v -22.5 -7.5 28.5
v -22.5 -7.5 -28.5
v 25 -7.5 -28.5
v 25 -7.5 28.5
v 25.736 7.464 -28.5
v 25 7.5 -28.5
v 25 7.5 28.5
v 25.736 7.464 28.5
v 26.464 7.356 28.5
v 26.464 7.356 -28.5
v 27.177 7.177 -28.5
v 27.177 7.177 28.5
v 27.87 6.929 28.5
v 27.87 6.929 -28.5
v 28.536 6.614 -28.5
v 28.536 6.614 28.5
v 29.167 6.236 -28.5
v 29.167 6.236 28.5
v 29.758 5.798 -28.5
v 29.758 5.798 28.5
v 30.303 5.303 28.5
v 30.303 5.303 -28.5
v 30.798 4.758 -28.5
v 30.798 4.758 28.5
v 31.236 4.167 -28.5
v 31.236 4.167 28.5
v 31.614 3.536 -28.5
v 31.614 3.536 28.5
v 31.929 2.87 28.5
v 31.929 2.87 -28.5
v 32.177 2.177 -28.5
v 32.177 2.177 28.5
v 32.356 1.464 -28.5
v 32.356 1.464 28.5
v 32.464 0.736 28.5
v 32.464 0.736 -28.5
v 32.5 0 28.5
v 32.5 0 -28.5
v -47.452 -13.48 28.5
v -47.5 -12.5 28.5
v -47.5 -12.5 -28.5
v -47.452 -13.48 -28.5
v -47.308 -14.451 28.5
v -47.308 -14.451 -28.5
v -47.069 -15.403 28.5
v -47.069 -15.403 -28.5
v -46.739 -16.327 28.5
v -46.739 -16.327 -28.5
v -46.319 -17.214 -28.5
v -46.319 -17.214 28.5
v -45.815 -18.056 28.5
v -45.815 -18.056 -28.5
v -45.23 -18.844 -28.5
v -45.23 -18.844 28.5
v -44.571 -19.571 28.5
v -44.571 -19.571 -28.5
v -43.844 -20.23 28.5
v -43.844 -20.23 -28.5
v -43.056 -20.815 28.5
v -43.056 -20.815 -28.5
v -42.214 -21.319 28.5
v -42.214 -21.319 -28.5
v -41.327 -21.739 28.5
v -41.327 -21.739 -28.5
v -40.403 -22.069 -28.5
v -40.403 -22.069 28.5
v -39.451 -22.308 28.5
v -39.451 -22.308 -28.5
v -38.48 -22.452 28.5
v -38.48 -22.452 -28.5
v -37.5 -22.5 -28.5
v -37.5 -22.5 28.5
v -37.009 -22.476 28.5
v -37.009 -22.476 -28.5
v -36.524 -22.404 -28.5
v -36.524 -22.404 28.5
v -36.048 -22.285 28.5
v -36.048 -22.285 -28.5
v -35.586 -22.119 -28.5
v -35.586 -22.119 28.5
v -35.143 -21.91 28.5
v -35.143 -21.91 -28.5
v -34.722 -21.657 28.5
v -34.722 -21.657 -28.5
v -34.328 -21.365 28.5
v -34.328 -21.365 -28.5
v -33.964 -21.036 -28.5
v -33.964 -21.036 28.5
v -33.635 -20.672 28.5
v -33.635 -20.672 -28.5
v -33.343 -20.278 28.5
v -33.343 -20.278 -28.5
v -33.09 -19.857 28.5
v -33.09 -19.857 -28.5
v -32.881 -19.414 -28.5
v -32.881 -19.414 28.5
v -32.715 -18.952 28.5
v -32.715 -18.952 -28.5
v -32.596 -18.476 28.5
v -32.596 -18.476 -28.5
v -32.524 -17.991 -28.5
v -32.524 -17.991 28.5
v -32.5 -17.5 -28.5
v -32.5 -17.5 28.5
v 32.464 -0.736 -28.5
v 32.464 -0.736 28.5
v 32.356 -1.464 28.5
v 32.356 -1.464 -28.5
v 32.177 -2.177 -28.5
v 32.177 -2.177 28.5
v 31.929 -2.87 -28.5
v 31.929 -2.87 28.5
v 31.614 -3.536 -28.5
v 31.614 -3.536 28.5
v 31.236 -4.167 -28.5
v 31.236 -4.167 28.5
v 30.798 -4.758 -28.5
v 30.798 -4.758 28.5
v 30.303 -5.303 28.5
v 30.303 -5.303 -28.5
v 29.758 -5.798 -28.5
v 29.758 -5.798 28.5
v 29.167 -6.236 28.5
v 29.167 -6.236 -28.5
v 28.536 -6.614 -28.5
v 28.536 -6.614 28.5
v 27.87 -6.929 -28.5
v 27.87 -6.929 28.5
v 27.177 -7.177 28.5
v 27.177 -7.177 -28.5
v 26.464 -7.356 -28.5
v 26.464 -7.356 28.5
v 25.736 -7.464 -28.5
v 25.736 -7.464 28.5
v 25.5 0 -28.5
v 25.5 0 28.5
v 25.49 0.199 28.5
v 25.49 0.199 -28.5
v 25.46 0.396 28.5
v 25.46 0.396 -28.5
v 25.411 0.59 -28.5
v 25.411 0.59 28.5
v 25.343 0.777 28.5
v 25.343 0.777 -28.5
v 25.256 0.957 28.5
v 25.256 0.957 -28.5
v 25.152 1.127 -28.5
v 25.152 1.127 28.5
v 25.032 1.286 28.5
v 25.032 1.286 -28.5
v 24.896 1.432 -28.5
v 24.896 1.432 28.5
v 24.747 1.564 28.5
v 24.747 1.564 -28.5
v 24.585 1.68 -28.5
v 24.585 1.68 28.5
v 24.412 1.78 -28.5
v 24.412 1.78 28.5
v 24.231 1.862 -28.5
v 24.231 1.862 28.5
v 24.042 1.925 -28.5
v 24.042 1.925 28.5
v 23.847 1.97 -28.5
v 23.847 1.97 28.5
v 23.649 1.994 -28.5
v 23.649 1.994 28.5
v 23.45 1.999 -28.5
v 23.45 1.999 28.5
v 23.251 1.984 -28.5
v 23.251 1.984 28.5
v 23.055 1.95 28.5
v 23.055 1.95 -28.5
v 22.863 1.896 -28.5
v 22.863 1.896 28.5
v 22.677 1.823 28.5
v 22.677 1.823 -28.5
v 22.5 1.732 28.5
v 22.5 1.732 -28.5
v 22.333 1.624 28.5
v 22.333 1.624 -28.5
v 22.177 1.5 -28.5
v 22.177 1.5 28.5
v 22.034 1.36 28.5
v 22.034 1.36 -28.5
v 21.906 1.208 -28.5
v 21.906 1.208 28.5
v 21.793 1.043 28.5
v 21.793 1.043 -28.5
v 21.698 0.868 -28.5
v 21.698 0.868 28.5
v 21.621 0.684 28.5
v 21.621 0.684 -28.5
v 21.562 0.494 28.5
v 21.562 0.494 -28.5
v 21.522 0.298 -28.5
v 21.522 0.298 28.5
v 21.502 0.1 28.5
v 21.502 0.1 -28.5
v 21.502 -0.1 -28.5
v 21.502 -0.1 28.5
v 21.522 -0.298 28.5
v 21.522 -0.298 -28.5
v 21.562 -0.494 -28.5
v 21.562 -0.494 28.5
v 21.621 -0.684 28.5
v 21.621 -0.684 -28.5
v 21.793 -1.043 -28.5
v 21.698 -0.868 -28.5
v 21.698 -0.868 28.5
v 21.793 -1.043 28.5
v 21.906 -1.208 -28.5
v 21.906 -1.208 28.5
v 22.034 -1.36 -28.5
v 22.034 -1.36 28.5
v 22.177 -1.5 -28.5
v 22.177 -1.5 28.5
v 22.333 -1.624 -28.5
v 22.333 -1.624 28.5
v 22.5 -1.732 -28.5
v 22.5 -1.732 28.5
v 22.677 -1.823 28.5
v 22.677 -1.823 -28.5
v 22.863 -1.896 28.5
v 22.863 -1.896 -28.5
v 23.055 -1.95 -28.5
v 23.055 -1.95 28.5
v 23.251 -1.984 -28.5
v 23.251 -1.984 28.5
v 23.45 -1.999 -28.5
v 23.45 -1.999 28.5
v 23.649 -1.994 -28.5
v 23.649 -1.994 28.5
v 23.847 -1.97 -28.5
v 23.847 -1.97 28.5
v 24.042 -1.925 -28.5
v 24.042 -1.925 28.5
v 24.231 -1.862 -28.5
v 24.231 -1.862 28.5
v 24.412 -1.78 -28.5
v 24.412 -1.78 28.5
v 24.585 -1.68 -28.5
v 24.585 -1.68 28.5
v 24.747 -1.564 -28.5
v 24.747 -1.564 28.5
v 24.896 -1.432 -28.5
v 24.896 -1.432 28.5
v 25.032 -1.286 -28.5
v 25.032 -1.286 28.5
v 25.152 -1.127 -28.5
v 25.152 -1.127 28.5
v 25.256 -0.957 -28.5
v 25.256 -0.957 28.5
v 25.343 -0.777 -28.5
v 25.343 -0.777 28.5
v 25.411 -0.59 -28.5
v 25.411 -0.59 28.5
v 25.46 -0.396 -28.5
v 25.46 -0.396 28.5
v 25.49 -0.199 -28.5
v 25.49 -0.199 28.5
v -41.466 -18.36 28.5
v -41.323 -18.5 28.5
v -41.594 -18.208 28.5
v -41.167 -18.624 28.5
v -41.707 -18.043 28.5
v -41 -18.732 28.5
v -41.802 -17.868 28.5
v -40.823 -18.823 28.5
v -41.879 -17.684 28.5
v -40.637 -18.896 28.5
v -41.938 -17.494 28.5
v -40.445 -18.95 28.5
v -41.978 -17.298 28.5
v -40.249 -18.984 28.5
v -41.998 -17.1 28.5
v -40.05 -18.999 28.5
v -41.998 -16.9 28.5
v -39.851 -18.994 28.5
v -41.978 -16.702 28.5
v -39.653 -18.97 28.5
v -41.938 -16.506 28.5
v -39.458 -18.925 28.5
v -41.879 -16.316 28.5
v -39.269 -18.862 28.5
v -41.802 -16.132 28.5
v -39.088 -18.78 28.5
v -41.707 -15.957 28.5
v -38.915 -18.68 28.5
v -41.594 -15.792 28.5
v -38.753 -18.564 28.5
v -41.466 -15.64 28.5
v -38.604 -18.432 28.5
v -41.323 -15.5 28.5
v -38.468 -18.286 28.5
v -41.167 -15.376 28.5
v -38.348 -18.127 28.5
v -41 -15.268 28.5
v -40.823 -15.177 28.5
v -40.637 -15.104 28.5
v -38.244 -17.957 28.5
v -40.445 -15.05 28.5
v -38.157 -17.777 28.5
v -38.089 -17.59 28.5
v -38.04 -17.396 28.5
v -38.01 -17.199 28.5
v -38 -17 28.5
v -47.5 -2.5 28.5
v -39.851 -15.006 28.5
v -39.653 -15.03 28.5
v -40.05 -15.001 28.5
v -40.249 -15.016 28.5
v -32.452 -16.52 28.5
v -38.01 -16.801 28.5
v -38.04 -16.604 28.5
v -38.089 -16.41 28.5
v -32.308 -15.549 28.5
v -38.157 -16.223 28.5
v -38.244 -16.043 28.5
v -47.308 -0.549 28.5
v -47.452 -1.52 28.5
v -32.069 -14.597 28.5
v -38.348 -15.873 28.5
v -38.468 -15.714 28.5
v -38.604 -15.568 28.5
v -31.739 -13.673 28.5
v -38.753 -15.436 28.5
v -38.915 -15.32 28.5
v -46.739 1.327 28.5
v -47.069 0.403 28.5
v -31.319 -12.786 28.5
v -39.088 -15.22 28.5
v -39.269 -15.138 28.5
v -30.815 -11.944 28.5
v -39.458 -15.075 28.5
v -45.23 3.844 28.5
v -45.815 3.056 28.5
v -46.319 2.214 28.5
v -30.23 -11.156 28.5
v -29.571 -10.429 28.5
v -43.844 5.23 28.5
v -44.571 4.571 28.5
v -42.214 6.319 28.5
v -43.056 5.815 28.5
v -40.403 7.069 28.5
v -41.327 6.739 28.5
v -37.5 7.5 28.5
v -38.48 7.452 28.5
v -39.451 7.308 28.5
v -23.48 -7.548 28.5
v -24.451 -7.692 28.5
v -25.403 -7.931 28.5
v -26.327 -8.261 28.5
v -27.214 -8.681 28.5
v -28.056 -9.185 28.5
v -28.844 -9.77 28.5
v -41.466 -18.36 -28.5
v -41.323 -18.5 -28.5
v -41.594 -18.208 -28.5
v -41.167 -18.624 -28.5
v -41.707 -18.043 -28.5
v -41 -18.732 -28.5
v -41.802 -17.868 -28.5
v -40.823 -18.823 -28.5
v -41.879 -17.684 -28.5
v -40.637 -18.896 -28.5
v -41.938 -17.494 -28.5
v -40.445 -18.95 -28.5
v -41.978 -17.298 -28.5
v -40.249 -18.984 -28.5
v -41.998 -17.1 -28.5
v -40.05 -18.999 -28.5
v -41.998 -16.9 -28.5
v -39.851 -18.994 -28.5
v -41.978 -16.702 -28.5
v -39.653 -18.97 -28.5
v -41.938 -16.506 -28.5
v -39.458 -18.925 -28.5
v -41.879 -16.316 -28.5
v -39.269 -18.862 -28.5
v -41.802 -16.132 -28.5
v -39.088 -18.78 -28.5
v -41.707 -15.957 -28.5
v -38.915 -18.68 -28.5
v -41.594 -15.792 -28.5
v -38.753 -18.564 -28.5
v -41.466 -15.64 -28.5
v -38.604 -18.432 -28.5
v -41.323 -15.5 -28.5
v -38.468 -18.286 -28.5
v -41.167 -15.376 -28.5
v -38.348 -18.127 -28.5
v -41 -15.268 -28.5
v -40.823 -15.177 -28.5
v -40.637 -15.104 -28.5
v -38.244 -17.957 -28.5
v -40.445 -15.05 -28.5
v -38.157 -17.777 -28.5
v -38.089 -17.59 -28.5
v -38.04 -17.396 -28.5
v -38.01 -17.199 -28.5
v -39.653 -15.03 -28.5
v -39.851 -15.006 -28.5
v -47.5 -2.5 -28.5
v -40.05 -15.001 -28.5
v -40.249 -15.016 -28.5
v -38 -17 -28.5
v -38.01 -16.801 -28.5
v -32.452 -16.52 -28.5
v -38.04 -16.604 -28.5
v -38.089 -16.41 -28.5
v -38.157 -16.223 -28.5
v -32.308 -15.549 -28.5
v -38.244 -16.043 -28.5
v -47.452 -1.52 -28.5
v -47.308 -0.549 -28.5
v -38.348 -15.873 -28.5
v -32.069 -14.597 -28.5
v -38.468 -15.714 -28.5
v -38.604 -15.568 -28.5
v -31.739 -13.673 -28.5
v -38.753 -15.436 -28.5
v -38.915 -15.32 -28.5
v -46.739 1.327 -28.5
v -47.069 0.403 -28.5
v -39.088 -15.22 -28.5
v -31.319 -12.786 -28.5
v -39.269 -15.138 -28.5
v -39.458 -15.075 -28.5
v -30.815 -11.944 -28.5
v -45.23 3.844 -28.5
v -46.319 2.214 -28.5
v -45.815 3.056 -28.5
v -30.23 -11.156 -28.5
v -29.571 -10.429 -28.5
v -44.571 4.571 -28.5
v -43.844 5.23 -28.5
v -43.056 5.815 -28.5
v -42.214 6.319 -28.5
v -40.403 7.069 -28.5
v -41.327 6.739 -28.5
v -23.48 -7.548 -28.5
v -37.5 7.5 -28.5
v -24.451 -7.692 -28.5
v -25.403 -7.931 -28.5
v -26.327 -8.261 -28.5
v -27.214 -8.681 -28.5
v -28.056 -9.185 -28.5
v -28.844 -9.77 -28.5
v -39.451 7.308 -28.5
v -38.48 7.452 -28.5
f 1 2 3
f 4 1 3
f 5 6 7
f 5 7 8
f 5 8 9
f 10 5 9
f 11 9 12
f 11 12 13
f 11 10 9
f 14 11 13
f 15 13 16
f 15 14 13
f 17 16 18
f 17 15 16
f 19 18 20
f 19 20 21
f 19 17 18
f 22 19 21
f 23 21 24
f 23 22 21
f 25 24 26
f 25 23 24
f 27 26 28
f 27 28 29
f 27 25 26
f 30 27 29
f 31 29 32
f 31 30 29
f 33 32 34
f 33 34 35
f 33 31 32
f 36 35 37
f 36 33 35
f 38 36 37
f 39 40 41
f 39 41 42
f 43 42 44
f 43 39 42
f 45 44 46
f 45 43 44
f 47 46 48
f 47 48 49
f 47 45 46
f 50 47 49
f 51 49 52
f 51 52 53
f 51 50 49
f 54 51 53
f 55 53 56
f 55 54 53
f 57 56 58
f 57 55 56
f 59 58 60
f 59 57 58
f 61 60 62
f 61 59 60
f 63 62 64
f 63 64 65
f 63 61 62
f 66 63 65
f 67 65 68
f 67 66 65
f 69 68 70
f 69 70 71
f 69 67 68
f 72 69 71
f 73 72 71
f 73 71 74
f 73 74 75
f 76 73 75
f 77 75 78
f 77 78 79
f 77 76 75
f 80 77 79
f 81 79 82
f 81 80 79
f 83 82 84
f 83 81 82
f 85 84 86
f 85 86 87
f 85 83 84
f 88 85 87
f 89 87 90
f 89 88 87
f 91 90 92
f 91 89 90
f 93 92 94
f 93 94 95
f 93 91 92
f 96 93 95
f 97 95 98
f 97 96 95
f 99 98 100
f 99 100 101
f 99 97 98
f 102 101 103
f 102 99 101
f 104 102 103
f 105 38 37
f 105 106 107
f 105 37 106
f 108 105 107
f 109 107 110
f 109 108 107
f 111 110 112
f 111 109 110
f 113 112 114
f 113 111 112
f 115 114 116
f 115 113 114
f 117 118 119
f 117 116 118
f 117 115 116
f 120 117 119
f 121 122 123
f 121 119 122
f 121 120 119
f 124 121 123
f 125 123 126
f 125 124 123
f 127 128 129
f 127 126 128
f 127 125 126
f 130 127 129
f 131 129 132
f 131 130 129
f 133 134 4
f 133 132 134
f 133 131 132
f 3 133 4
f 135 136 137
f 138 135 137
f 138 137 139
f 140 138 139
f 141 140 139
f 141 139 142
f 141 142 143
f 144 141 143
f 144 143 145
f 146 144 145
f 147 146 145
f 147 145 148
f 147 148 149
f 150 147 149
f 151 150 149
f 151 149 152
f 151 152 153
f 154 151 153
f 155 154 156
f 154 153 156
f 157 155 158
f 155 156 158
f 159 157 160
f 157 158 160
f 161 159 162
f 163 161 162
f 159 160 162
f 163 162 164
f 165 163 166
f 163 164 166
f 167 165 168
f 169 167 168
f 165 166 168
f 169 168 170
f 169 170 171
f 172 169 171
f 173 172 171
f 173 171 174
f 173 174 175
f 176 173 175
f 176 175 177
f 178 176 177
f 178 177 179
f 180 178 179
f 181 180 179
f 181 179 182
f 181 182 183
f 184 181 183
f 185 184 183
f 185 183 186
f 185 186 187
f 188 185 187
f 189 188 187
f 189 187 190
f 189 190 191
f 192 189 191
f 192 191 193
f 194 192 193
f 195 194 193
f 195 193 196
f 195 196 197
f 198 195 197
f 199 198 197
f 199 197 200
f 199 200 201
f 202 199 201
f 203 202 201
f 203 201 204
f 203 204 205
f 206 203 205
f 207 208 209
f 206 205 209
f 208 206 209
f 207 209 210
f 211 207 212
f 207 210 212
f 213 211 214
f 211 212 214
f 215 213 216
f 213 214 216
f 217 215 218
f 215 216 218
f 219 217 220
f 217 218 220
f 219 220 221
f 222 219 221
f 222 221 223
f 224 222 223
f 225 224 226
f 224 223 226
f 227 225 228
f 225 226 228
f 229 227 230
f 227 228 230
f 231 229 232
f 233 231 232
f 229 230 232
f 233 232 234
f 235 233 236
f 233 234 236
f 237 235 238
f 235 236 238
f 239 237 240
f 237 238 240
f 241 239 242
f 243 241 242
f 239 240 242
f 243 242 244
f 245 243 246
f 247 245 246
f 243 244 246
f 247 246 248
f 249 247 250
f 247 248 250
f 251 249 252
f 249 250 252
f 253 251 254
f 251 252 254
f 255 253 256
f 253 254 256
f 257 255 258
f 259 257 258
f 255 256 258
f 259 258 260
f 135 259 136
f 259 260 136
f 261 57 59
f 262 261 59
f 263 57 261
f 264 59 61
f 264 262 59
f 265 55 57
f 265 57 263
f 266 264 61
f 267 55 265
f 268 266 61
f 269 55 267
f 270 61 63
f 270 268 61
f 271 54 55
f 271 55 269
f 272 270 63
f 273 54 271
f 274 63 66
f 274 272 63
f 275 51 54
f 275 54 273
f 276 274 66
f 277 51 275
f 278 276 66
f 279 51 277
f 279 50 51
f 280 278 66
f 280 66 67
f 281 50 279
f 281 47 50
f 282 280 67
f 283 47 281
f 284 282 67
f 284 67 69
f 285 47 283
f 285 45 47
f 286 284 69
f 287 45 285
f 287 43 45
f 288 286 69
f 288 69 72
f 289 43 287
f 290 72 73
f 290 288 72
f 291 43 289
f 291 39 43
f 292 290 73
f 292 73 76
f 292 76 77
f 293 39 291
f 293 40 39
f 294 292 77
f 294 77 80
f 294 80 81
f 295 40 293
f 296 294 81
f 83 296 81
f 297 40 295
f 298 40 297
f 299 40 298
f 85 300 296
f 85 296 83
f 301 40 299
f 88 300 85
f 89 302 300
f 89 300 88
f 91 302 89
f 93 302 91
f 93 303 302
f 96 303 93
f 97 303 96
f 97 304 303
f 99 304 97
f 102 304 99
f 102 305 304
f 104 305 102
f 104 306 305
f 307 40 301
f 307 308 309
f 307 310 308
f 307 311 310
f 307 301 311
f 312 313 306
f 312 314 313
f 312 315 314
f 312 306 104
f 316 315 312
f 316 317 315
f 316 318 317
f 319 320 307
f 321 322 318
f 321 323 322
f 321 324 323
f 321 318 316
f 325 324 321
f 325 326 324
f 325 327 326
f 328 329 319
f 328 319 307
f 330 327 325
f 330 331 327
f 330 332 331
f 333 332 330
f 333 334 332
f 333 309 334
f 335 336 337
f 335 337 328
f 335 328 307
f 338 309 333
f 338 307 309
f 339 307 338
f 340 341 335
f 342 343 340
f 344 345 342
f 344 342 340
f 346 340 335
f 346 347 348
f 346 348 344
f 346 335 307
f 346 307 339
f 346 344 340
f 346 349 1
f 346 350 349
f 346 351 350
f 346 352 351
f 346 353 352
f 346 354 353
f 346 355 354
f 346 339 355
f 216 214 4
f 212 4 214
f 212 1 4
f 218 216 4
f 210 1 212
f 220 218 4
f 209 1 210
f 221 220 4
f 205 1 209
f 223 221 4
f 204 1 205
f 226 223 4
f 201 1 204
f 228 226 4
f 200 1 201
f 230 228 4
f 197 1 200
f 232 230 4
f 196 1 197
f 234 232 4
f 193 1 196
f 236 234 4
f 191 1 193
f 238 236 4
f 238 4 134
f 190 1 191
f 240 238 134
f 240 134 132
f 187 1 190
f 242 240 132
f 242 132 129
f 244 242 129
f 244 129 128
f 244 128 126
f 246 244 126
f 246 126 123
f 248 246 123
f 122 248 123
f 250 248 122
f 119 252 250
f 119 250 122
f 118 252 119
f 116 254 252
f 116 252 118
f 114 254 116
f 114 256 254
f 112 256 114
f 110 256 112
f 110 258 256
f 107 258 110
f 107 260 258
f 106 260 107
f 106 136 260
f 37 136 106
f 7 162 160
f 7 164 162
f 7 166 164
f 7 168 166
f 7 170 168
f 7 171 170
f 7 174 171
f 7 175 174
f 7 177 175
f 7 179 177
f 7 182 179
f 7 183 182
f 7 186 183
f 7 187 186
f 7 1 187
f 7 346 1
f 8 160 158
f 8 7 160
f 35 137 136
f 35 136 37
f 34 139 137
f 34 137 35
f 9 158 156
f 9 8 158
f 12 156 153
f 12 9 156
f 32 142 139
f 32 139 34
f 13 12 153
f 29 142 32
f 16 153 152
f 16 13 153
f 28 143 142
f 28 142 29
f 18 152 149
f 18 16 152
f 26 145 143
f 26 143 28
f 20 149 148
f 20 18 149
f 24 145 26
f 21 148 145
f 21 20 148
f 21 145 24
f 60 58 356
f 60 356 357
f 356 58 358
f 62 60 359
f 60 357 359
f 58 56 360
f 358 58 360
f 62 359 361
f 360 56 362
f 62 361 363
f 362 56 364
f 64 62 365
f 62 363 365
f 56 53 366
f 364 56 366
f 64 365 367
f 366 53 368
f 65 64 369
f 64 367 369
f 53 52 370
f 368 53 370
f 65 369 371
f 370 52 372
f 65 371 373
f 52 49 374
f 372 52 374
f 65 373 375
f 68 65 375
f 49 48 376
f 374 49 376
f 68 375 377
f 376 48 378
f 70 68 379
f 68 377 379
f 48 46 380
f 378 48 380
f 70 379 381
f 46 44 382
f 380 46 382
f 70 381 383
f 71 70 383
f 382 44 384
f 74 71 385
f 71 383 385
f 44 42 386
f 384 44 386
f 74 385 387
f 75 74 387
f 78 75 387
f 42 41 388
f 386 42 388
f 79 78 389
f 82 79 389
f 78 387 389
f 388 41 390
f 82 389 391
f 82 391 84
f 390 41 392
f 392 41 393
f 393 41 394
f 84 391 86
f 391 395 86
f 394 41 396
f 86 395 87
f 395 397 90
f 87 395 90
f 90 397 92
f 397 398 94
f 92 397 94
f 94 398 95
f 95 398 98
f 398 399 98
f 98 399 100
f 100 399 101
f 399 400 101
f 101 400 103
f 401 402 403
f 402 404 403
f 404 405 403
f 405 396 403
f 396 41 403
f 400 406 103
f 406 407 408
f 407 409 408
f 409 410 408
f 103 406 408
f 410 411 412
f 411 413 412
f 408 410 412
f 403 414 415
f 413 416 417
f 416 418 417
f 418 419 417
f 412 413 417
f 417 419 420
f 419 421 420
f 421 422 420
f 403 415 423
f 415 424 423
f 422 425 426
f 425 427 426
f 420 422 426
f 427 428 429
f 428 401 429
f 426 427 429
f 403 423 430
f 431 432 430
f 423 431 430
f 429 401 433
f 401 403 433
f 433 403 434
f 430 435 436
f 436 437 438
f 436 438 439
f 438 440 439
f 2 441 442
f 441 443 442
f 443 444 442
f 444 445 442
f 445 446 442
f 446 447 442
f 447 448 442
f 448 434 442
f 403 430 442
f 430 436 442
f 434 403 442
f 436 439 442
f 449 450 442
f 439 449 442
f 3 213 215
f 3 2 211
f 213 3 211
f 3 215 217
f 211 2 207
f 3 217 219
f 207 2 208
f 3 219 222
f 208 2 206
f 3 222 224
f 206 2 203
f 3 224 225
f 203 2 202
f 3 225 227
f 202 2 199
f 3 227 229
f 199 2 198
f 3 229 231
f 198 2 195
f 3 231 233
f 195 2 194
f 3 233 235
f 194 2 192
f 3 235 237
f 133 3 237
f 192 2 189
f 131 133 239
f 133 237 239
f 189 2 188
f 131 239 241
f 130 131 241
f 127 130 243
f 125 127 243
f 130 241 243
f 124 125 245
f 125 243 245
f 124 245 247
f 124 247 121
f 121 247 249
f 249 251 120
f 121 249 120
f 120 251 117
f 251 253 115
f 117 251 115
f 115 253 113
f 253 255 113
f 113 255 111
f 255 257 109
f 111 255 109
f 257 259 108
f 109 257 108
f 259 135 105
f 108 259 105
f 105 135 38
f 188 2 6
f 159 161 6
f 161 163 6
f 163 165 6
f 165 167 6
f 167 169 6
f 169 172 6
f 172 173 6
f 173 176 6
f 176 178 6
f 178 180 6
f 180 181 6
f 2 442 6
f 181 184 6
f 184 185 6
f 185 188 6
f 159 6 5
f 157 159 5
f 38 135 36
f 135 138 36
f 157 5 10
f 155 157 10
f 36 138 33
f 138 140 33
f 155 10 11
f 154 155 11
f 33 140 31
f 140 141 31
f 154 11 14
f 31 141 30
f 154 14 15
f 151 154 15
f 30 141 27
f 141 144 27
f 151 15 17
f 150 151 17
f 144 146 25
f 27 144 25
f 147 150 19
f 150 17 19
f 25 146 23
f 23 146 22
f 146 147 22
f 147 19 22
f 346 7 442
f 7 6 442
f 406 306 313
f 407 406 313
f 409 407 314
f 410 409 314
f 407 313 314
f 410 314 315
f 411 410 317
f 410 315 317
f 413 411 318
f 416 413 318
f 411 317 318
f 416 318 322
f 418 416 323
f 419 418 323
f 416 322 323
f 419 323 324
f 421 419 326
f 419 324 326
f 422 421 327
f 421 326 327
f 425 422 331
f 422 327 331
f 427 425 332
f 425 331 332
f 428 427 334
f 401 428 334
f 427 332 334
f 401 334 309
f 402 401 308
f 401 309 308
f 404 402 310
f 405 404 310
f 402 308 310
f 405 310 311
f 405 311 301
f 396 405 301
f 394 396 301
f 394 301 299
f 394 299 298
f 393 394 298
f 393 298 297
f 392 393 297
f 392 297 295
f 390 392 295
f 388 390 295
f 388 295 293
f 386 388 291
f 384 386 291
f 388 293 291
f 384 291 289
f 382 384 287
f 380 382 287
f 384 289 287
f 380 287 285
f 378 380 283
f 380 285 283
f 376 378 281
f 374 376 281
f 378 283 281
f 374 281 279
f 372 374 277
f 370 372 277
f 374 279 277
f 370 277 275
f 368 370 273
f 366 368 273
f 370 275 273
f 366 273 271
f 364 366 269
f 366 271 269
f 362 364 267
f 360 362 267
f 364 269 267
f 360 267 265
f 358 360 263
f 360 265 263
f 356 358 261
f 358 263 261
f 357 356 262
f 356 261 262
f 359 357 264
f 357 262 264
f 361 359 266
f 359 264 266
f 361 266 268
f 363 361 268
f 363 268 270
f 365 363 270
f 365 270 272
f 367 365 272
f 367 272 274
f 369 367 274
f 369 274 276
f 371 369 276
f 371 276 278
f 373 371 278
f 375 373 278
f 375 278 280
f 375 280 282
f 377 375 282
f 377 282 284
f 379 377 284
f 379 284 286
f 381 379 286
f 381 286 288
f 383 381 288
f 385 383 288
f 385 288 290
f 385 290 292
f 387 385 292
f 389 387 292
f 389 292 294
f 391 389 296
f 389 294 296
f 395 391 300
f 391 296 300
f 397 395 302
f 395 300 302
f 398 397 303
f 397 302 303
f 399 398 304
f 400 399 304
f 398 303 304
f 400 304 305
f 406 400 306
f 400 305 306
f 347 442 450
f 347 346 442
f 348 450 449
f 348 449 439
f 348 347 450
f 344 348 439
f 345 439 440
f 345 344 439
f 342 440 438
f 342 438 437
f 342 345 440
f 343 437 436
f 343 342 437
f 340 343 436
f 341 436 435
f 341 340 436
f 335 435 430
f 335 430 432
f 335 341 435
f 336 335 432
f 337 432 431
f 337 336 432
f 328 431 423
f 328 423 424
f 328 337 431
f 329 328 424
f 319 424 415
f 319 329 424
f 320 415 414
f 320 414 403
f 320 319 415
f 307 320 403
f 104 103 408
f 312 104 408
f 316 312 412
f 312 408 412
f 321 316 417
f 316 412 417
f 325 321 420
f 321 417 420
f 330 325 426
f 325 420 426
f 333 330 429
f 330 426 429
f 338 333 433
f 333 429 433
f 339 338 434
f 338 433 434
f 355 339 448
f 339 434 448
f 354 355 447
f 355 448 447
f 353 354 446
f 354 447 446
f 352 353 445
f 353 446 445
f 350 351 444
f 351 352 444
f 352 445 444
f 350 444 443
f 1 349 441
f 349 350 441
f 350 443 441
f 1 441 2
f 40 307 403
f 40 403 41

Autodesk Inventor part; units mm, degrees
ref_plane "XZ Plane" through (0, 0, 0) normal (0, 1, 0) x (-1, 0, 0)
ref_plane "XY Plane" through (0, 0, 0) normal (0, 0, 1) x (1, 0, 0)
sketch "Эскиз1" plane through (0, 0, 0) normal (0, 0, 1) x (1, 0, 0)
  line L0 (-32.5, -7.5) -> (32.5, -7.5)
  line L1 (32.5, -7.5) -> (32.5, 7.5)
  line L2 (32.5, 7.5) -> (-32.5, 7.5)
  line L3 (-32.5, -7.5) -> (32.5, 7.5) construction
  line L4 (32.5, -7.5) -> (-32.5, 7.5) construction
  line L5 (-32.5, 7.5) -> (-47.5, 7.5)
  line L6 (-47.5, 7.5) -> (-47.5, -22.5)
  line L7 (-47.5, -22.5) -> (-32.5, -22.5)
  line L8 (-32.5, -22.5) -> (-32.5, -7.5)
  line L9 (-32.5, -7.5) -> (-32.5, 7.5)
  point P0 (0, 0)
  dimension "d5" = 65
  dimension "d6" = 15
  dimension "d7" = 30
  dimension "d8" = 15
extrude "Выдавливание1" add sketch "Эскиз1" along normal mid plane 57
sketch "Эскиз2" plane through (0, 0, 28.5) normal (0, 0, 1) x (1, 0, 0)
  circle A0 centre (-40, -17) radius 2
  circle A1 centre (23.5, 0) radius 2
  line L0 (-47.5, -22.5) -> (-32.5, -22.5) projected
  line L1 (-40, -22.5) -> (-40, 7.5) construction
  line L2 (32.5, 7.5) -> (-47.5, 7.5) projected
  line L3 (32.5, -7.5) -> (32.5, 7.5) projected
  circle A2 centre (23.5, 0) radius 2
  point P0 (0, 0)
  dimension "d9" = 4
  dimension "d10" = 5.5
  dimension "d17" = 9
extrude "Выдавливание2" cut sketch "Эскиз2" against normal up to surface (57 mm away)
fillet "Сопряжение1" radius 10 3 edges at (-47.5, 7.5, 0) (-47.5, -22.5, 0) (-32.5, -7.5, 0)
fillet "Сопряжение2" radius 5 1 edges at (-32.5, -22.5, 0)
fillet "Сопряжение4" radius 7.5 2 edges at (32.5, 7.5, 0) (32.5, -7.5, 0)
properties part number "Фиксатор головы"
